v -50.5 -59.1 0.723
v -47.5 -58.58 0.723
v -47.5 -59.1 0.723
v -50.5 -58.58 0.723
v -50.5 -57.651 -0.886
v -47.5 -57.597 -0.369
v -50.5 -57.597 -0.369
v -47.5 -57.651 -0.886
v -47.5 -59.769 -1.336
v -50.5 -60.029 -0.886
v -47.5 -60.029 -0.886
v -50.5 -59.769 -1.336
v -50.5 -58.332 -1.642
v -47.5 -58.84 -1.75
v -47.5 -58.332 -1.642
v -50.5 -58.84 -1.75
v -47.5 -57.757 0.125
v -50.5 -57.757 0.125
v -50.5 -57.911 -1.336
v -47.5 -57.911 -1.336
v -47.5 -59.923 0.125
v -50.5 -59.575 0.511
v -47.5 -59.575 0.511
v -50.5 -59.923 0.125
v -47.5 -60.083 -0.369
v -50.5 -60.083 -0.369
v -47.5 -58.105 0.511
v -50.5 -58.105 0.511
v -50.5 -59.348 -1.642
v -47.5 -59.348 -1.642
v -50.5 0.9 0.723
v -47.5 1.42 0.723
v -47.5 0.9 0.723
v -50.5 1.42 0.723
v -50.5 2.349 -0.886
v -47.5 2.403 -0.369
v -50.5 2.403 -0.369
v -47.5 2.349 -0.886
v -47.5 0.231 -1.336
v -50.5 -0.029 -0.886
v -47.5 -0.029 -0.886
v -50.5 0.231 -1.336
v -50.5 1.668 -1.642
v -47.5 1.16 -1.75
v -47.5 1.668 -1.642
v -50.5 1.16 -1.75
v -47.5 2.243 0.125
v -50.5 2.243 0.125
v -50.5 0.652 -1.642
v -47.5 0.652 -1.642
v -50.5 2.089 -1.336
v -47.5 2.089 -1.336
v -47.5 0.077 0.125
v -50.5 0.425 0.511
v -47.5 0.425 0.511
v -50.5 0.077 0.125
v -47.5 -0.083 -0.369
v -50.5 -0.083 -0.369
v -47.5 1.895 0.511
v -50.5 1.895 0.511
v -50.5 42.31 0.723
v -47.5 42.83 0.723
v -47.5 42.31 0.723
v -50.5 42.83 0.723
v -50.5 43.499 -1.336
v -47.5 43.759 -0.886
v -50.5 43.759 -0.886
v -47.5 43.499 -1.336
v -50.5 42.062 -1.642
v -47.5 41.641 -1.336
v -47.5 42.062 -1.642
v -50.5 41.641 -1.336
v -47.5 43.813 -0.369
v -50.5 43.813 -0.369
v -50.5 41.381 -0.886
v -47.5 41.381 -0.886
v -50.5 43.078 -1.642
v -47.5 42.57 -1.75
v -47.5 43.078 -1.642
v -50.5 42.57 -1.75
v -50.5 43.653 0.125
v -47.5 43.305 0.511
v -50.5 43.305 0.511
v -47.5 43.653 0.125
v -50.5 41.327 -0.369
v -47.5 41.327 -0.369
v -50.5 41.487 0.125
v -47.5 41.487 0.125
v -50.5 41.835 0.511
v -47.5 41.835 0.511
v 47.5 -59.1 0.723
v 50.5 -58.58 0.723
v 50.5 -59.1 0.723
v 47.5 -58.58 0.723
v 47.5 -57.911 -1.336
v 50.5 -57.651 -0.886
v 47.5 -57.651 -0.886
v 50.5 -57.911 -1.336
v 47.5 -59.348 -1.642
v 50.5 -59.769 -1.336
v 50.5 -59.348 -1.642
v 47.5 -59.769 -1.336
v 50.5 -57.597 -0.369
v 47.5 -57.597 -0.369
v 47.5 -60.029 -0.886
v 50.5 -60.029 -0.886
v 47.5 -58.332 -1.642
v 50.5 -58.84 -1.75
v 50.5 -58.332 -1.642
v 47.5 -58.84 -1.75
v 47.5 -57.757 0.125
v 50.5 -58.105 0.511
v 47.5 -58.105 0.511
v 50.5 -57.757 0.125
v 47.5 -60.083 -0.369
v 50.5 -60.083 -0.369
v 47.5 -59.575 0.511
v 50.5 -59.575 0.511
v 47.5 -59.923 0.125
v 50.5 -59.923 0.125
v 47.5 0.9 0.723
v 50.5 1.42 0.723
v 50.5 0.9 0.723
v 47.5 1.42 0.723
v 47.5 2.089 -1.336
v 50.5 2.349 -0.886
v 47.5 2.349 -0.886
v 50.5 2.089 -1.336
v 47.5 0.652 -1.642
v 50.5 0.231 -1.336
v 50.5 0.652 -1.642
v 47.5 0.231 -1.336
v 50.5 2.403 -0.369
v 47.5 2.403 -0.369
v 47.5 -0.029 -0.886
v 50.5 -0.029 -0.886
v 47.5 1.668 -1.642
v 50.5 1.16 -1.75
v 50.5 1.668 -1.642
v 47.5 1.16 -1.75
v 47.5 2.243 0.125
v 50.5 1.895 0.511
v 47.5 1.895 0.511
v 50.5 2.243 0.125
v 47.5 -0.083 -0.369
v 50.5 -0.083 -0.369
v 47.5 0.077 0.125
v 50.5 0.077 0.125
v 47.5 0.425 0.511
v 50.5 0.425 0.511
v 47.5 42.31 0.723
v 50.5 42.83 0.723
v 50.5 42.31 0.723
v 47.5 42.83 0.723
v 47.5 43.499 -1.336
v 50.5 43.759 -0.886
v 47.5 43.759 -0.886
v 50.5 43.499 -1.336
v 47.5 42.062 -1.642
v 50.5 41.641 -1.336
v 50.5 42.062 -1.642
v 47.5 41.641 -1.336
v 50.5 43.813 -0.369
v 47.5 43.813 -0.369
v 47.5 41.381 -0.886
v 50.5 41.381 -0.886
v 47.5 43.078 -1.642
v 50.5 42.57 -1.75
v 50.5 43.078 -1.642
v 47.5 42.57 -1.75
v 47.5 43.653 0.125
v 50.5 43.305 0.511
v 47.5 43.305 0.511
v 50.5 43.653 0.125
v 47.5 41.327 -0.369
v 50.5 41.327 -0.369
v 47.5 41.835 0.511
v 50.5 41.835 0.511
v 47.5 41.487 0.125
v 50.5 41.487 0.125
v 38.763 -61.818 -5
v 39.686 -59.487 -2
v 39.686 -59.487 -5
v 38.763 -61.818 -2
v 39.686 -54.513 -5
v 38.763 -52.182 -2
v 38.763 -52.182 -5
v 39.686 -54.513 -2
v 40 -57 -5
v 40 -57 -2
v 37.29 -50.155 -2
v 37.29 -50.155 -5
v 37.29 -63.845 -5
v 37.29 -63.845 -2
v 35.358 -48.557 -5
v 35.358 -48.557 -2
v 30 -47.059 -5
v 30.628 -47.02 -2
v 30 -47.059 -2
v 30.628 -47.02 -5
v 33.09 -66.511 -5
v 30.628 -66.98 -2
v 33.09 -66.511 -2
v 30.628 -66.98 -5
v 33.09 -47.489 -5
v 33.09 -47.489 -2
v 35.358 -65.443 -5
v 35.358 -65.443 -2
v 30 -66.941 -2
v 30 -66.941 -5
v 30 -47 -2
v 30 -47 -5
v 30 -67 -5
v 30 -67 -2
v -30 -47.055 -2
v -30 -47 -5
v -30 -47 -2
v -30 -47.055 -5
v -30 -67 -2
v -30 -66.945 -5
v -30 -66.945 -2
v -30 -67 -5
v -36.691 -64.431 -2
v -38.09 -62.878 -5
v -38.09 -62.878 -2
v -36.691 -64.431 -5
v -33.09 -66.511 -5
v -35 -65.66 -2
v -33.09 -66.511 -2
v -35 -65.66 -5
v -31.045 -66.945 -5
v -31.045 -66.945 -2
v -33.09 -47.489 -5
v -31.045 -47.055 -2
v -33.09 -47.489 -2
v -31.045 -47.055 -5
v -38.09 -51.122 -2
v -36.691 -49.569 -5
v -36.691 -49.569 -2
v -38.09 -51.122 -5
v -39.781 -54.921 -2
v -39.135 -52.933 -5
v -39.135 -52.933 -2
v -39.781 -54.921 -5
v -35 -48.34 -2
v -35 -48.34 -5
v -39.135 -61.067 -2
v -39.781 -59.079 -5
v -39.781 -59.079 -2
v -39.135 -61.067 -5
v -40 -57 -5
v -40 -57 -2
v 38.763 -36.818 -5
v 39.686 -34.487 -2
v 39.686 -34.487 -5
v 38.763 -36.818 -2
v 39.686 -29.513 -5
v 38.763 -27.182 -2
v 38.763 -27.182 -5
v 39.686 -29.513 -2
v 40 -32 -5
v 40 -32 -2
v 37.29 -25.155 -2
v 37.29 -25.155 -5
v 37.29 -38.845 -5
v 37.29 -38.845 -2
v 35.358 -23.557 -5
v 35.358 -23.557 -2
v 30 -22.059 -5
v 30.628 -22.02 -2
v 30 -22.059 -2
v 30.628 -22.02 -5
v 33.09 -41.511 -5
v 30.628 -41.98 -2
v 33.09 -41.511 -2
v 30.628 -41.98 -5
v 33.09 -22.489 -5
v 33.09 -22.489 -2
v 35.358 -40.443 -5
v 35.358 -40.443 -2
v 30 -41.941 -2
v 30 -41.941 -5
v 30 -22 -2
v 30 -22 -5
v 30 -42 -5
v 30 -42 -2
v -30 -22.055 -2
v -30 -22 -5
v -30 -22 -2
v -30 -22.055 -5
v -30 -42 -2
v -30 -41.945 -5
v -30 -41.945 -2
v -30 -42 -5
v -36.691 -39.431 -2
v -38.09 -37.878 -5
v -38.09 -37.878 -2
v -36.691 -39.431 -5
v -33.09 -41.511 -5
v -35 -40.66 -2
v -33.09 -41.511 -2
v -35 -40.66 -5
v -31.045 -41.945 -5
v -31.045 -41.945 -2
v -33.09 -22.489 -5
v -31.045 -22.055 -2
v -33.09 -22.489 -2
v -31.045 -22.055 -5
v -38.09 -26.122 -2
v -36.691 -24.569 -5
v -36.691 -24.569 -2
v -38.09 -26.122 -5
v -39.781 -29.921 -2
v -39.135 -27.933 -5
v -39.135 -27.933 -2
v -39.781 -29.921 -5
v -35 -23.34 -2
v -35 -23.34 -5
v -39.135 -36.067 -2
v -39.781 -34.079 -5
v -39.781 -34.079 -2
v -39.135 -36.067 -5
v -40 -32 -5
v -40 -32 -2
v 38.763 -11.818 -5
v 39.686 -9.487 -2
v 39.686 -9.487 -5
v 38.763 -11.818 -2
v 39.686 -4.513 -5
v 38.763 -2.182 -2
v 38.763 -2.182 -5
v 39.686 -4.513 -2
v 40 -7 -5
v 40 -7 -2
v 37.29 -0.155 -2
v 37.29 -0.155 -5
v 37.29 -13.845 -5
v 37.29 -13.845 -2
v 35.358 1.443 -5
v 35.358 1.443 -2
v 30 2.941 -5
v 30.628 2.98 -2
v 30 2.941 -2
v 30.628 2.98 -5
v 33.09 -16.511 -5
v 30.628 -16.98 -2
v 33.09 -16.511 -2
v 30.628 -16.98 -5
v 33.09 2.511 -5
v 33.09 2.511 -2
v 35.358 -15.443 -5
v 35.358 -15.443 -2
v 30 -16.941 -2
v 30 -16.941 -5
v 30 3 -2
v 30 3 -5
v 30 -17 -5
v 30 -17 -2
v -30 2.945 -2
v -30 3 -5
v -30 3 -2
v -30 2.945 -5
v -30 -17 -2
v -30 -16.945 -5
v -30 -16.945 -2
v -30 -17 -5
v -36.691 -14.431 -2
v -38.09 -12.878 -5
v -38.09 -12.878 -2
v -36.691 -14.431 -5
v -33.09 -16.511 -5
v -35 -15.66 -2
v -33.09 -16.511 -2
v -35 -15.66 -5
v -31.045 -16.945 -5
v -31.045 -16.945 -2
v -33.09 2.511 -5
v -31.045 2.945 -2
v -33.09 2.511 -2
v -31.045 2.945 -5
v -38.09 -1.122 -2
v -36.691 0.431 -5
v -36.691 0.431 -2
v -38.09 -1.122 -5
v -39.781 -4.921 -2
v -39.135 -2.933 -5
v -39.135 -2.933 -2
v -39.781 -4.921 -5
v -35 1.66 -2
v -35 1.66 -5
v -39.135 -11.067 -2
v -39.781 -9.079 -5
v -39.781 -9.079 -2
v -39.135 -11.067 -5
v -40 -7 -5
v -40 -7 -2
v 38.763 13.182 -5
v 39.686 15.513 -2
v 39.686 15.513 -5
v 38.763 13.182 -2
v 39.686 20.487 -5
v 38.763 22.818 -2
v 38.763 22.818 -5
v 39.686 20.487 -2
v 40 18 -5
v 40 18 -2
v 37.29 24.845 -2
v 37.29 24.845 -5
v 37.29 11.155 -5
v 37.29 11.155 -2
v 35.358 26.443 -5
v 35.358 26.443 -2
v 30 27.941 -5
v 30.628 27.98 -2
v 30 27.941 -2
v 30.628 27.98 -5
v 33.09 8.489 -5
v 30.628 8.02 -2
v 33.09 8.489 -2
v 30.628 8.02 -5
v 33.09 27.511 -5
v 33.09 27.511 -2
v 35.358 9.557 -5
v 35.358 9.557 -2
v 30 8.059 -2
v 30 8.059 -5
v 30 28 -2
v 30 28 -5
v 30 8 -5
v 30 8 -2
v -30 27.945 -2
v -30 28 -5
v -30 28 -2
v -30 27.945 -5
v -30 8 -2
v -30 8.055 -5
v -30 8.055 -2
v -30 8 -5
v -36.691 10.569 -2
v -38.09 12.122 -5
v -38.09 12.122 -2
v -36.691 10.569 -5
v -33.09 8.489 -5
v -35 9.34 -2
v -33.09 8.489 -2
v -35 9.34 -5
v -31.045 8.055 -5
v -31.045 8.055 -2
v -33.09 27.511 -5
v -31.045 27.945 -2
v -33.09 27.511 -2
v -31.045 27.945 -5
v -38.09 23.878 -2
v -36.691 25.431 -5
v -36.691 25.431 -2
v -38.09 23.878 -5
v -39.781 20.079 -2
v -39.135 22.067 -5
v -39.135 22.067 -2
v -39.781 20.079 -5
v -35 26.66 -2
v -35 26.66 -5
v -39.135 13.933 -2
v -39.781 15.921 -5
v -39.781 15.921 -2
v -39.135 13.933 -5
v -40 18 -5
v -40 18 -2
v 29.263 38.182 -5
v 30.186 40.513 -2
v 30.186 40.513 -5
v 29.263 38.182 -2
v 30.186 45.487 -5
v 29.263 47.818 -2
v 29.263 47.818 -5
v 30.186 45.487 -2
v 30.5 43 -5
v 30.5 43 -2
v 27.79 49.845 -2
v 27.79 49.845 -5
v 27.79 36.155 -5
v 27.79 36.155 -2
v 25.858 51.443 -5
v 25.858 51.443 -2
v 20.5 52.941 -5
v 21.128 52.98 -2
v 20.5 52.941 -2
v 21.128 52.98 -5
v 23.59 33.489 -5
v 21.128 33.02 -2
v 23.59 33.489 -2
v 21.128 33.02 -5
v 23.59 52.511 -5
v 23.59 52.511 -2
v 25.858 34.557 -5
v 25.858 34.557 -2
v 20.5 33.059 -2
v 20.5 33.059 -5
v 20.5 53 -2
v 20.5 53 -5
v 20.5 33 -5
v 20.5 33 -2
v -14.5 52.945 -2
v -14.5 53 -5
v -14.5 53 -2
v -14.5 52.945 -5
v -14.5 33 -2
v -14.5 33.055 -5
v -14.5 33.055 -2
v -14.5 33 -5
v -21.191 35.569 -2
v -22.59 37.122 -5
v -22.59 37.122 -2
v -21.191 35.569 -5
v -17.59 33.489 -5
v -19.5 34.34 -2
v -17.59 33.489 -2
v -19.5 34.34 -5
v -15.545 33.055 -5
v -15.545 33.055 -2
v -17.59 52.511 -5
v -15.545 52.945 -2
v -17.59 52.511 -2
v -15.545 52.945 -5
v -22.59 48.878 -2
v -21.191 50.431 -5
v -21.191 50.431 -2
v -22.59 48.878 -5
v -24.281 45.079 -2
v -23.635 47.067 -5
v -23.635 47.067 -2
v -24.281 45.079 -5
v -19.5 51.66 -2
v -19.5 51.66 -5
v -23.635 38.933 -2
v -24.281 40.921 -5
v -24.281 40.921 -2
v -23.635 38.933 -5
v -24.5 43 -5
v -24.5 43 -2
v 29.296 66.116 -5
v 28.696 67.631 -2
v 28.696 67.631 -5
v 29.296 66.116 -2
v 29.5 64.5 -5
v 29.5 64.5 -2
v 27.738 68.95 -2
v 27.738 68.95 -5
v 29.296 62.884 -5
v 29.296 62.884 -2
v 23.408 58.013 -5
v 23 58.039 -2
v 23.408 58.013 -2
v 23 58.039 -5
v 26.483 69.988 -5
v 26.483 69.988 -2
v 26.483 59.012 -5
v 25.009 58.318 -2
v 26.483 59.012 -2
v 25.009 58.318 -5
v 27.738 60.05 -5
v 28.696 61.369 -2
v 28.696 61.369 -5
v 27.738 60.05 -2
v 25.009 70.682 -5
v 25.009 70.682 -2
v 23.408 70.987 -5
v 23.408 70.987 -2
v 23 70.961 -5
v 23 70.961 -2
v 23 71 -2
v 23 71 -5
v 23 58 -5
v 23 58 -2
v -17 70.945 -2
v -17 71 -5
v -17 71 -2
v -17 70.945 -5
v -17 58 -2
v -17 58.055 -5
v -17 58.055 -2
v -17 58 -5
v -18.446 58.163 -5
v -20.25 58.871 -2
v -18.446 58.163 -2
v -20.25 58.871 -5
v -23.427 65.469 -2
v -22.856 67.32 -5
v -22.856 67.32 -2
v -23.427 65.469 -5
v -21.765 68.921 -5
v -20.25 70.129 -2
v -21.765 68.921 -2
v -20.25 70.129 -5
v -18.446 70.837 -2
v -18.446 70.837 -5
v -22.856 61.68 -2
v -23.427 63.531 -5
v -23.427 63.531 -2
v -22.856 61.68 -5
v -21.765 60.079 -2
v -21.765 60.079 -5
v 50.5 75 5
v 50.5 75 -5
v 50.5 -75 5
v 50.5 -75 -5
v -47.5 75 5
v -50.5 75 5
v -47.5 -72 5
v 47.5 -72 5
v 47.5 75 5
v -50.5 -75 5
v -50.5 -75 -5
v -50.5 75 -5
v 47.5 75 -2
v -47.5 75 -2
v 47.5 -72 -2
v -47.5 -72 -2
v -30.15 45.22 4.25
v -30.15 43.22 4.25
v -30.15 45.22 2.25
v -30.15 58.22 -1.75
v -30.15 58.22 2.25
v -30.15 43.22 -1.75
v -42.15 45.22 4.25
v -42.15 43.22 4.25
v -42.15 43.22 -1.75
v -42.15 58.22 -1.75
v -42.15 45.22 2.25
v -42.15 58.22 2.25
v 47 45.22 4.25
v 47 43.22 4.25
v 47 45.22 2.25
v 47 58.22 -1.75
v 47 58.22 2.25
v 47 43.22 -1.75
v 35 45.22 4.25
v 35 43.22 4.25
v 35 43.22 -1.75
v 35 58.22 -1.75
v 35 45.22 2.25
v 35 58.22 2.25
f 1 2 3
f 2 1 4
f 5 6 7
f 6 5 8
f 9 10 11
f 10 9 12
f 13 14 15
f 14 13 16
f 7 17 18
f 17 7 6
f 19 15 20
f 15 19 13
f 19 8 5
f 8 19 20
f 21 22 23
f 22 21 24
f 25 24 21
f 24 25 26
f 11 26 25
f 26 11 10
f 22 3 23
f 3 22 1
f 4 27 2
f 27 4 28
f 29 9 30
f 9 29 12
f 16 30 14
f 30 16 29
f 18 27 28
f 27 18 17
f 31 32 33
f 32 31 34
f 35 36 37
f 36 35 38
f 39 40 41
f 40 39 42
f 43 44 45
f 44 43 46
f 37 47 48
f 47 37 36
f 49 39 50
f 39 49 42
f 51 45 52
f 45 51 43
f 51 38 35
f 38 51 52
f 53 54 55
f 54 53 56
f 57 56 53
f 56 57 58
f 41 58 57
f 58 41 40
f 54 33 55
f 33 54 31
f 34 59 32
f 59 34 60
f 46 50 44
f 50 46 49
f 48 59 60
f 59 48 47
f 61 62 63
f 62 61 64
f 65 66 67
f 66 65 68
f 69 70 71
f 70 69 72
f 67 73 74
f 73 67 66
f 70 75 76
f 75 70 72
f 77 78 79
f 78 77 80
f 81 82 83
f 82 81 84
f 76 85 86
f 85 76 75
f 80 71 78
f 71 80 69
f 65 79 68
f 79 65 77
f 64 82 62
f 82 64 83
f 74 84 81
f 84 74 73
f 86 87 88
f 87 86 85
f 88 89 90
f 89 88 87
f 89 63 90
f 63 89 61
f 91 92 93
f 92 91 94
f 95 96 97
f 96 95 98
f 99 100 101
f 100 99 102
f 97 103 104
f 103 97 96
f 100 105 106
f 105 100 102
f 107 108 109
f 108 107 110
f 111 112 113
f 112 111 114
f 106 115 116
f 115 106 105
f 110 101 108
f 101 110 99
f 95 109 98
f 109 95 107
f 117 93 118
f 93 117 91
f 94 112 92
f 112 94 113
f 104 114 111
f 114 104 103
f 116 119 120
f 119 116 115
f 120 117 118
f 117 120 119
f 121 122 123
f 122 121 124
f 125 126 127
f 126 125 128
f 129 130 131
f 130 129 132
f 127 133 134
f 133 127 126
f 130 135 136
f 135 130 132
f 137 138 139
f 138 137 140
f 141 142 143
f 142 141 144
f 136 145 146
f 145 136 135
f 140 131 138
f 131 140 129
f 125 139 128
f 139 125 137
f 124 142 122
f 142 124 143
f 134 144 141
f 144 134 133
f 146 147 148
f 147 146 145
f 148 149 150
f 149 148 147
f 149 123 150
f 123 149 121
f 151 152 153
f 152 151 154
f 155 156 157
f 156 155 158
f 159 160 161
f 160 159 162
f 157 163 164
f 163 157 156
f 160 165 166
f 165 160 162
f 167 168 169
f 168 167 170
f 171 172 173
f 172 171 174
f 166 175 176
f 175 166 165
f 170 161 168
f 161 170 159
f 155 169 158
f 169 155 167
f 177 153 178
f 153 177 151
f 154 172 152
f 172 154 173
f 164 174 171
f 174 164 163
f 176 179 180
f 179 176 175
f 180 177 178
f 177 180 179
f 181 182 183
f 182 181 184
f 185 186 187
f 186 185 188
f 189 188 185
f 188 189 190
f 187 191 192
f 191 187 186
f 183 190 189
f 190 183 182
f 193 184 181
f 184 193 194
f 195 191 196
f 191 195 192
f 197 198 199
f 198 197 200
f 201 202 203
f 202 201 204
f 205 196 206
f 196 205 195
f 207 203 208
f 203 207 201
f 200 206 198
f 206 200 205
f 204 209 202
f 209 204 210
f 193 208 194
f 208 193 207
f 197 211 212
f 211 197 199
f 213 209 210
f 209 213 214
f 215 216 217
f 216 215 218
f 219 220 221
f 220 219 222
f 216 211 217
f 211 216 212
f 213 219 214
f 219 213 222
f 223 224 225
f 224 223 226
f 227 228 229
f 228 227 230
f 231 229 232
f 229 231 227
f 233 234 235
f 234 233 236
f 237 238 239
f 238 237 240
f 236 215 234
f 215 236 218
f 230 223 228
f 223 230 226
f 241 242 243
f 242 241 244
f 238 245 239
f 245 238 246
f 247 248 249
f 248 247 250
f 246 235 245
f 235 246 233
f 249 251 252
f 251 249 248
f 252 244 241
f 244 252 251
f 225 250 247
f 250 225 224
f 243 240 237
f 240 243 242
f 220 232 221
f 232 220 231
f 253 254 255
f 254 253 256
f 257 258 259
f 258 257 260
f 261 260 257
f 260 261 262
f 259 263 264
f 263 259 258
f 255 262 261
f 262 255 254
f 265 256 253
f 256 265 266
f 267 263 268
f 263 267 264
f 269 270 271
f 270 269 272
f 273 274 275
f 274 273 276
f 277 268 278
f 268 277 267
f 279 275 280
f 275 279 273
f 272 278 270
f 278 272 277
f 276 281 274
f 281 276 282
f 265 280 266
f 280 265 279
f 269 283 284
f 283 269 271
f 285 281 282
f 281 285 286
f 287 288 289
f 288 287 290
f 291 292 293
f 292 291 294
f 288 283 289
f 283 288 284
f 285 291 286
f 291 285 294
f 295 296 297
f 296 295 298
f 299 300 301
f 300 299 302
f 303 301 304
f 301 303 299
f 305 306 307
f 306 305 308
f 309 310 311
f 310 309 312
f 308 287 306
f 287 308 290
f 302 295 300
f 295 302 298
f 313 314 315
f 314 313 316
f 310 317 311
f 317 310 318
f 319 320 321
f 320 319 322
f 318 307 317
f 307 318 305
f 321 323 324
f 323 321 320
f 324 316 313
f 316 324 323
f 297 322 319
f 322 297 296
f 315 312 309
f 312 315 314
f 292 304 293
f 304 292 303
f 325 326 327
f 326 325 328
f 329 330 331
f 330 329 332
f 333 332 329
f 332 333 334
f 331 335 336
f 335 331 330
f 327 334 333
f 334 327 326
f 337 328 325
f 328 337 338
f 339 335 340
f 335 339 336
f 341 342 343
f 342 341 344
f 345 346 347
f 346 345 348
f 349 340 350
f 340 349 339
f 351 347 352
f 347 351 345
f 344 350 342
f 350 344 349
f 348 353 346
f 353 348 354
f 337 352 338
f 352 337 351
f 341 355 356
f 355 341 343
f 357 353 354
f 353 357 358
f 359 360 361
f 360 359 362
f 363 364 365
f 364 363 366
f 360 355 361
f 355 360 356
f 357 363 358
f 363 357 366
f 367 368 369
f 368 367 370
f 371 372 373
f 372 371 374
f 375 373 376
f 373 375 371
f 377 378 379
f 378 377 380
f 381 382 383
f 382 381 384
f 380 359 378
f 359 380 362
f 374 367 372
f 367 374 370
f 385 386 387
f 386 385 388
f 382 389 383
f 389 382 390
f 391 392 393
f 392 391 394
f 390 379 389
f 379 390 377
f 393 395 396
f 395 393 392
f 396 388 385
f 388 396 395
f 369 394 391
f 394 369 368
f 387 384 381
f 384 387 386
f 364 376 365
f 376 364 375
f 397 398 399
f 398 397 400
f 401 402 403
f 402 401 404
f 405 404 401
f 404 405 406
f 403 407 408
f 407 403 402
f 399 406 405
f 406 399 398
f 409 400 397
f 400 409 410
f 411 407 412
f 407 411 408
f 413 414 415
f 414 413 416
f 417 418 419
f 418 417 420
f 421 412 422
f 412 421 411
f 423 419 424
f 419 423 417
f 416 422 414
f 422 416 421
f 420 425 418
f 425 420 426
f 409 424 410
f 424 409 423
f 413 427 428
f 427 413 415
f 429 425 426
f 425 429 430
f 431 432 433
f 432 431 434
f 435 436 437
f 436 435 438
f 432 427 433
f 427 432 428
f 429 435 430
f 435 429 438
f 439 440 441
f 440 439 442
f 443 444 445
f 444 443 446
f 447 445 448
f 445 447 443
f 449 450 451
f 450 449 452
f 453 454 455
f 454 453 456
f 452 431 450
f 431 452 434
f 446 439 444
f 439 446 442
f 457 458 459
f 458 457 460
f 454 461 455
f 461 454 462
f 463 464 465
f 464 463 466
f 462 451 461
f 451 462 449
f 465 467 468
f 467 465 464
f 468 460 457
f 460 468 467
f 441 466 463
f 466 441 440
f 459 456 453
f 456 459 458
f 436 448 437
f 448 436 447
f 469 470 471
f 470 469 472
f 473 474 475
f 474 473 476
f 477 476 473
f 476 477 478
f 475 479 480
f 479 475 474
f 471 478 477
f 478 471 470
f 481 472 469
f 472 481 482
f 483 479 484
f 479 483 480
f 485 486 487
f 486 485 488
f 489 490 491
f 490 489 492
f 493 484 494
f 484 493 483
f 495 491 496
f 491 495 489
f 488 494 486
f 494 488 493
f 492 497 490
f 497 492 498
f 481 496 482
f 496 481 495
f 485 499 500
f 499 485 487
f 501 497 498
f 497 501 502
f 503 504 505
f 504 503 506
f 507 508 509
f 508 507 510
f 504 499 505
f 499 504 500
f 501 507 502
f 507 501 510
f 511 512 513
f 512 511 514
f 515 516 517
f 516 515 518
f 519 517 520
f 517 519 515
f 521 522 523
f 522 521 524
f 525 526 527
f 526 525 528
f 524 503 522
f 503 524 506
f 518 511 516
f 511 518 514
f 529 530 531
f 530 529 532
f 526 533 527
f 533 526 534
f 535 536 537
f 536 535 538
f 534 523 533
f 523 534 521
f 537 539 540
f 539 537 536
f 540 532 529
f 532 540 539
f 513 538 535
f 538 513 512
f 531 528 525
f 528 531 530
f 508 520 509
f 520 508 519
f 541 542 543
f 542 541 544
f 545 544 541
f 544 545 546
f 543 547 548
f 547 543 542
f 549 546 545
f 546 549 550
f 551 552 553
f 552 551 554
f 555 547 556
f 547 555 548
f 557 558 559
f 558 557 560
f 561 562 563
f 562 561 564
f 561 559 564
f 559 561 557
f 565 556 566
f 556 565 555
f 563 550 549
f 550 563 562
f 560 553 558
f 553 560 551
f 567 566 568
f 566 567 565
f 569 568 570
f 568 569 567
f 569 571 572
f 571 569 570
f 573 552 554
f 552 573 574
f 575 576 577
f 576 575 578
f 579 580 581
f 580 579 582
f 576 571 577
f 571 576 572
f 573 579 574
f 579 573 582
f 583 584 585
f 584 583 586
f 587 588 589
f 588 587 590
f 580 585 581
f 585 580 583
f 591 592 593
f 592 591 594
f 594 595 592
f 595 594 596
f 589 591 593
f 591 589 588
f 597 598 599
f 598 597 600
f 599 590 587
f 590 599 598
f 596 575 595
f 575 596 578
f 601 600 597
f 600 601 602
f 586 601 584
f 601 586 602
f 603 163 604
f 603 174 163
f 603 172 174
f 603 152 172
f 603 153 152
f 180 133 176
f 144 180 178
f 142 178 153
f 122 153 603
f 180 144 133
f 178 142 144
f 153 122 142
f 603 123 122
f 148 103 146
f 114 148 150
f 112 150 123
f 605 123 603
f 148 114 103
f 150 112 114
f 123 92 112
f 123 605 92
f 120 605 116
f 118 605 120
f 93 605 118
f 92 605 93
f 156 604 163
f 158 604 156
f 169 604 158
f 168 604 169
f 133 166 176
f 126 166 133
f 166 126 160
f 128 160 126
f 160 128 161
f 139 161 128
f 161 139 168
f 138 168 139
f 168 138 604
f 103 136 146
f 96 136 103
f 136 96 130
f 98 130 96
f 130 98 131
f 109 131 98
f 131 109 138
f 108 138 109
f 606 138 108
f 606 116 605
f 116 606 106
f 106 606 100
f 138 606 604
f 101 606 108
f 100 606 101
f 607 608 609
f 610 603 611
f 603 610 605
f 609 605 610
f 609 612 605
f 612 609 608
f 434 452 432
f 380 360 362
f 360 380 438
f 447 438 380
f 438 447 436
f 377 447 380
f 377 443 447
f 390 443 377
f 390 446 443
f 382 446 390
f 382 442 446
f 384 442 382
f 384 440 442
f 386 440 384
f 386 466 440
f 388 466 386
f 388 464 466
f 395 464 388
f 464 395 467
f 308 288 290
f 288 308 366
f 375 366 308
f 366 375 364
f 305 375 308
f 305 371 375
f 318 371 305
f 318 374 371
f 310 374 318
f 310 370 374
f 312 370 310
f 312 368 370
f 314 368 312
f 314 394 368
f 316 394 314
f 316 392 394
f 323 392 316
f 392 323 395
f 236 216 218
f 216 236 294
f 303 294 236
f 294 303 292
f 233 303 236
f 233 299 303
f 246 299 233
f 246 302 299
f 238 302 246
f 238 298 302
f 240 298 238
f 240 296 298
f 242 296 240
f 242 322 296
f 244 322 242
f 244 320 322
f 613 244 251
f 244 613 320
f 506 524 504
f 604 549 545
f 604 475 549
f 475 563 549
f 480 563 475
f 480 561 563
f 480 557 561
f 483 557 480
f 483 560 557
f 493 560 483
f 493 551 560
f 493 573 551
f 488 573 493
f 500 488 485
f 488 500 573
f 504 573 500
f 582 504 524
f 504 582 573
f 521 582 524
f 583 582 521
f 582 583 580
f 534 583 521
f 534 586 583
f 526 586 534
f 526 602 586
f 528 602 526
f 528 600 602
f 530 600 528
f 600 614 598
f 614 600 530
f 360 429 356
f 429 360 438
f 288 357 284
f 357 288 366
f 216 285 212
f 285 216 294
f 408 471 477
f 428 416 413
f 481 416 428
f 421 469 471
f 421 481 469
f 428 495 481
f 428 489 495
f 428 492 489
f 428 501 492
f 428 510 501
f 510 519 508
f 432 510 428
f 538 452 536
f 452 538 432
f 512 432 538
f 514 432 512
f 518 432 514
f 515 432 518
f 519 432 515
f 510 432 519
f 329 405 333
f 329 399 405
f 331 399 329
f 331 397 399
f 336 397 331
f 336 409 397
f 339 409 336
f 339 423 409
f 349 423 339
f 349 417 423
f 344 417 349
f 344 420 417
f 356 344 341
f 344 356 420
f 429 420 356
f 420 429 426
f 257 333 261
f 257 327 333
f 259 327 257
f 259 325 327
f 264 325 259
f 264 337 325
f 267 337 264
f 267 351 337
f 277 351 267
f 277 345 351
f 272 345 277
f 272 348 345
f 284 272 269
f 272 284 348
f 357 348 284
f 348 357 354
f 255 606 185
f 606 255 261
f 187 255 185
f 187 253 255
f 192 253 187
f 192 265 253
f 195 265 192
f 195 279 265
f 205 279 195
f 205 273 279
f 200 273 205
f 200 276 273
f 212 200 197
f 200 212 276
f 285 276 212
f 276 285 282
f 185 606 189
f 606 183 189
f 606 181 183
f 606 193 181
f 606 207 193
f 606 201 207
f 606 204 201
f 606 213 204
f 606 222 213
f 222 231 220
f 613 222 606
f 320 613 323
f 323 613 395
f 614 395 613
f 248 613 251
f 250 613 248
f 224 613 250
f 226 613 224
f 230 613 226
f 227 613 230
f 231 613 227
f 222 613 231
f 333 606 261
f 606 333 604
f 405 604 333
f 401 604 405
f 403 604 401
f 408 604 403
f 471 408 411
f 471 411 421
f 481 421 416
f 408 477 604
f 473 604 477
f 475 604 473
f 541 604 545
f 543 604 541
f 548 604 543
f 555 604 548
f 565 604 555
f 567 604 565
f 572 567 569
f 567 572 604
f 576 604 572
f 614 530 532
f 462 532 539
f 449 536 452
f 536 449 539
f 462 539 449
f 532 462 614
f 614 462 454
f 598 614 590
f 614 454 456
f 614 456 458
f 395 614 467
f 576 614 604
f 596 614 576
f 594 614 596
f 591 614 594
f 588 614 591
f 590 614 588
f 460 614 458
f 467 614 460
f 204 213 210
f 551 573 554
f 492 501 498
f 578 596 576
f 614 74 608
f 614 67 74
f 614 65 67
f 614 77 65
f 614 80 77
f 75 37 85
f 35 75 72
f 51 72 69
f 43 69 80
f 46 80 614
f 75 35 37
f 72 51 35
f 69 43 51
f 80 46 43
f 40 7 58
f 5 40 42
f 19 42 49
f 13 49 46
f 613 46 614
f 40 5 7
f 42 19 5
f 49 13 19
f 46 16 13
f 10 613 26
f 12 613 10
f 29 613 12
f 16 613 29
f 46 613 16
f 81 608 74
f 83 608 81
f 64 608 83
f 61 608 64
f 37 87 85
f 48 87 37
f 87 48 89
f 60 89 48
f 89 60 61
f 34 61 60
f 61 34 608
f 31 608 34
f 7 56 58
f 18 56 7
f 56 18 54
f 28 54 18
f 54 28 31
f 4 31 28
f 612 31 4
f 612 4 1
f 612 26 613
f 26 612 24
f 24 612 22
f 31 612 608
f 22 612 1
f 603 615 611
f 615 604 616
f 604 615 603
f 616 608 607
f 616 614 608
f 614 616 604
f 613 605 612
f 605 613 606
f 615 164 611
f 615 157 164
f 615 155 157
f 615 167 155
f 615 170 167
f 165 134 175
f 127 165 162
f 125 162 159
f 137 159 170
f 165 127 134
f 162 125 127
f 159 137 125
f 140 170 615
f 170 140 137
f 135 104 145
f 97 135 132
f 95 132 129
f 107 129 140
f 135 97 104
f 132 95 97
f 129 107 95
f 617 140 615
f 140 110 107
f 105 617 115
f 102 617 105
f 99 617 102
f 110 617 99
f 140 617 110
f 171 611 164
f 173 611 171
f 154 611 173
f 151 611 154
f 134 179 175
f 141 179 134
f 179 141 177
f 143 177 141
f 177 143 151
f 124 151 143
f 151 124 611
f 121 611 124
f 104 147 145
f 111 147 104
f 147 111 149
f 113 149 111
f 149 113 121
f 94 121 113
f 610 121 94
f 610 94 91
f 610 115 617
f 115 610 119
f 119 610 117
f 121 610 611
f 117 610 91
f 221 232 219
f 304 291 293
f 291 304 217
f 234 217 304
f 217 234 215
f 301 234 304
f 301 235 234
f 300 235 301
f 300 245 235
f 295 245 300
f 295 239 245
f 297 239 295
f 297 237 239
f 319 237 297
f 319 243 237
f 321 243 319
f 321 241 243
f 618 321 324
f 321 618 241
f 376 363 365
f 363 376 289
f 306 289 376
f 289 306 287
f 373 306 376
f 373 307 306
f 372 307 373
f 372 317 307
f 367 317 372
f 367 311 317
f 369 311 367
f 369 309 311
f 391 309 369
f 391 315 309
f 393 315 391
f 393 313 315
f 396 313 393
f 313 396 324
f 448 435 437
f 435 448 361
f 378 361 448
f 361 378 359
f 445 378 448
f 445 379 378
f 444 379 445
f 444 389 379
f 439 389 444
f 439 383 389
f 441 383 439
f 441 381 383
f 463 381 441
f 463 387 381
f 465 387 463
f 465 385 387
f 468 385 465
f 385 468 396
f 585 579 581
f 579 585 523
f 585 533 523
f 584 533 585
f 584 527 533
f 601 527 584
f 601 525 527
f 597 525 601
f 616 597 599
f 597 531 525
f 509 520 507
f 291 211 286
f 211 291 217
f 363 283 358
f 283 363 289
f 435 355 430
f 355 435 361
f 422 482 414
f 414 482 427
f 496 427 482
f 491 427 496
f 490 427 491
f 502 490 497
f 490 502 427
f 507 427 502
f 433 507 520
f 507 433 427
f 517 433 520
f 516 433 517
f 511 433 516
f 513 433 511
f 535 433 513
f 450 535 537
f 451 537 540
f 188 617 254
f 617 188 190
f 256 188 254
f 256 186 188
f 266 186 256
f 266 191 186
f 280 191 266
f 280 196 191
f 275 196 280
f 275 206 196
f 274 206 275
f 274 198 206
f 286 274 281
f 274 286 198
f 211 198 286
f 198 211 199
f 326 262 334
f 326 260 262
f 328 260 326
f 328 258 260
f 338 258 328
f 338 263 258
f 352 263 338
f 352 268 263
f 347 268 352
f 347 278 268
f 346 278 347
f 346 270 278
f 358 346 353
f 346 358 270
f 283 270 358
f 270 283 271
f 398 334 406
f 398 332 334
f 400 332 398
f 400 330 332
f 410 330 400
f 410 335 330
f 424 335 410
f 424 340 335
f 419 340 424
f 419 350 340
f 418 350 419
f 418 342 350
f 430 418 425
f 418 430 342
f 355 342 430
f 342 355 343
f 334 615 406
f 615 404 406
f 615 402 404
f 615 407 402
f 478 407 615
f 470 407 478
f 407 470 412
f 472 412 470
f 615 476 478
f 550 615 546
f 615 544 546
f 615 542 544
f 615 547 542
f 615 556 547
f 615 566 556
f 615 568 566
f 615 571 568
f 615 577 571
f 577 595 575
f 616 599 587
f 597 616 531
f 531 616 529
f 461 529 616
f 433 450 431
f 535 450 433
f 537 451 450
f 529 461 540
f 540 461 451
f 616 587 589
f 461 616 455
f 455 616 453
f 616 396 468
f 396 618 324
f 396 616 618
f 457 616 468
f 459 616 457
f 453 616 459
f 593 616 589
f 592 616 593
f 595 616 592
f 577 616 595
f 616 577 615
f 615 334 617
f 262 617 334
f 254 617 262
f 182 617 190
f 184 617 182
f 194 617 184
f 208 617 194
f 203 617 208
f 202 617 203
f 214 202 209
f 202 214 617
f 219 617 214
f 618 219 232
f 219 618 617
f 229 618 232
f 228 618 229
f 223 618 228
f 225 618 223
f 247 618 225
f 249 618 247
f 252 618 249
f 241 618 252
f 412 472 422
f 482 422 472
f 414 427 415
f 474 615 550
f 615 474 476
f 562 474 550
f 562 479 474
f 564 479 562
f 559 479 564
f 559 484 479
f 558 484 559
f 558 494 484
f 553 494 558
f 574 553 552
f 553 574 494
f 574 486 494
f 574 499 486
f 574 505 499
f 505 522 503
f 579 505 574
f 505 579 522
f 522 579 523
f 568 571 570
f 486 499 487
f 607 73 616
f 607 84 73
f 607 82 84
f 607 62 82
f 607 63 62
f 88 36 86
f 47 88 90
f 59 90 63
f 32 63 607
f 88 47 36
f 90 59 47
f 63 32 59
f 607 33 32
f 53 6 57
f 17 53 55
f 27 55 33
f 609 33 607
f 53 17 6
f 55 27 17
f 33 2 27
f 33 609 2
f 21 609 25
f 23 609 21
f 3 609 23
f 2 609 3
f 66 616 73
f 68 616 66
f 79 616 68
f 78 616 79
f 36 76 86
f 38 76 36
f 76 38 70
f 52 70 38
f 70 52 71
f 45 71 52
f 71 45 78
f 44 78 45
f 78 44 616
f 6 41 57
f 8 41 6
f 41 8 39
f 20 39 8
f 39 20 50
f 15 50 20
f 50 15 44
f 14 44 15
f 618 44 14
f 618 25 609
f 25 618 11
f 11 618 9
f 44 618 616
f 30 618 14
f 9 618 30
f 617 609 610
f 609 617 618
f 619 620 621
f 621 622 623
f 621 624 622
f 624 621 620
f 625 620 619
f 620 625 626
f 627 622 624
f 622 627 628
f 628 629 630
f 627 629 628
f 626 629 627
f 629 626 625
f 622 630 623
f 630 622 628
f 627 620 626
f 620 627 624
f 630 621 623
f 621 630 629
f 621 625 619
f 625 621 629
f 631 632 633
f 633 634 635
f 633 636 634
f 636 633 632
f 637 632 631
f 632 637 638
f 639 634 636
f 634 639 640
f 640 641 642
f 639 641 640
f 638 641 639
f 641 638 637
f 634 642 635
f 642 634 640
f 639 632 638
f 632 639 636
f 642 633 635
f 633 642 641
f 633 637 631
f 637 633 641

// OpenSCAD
// 1.8" ZIF IDE to 3.5" tray
// Written by Michael Berry <michaelaberry@gmail.com>
model_version = "v1.0.0";

// Features: 
//  - ZIF to IDE Adapter mount
//  - Mount holes for 3.5" HDD
//  - Space for 1.8" ZIF IDE HDD/SDD

/*
TODO:
 - Add mounting holes to IDE board
 - Add proper lined holes to IDE board supports
*/
thickness = 3;

tray_x = 101;
tray_y = 150;
tray_z = 10;

offset_tray_x = tray_x / 2;
offset_tray_y = tray_y / 2;
offset_tray_z = tray_z / 2;

//Render the tray
difference() {
    color([0.9, 0.9, 0.9]) cube([tray_x, tray_y, tray_z], center = true);
    // Carve out the inner tray
    translate([0, thickness, thickness]) {
        cube([tray_x - 6, tray_y, tray_z], center = true);
    }

    // Carve out the mounting holes
    trayMount();
    mirror([tray_x, 0, 0]) trayMount();

    // Save some plastic!
    plasticSaverBase();
}

//Add supports
ideAdapterSupport();

//Parts Fitment Debugging
//ribbon();
//drive();
//ideAdapterBoard();

//Supports / Brackets / Mounts "Library"
module backSupport() {
    translate([20 - offset_tray_x, offset_tray_y - thickness, thickness - offset_tray_z]) {
        rotate([0, 0, 90]) prism(thickness, 17, tray_z - thickness);
    }
}
module trayMount() {
    from_front = 16.16;
    from_bottom = 6.5;
    diameter = 2.5;
    
    //Front mounting hole
    translate([offset_tray_x - tray_x, from_front - offset_tray_y, from_bottom - tray_z + thickness]) {
        rotate([0, 90, 0]) cylinder(r = diameter / 2, h = thickness * 2.5, center = true, $fn = 15);
    }
    
    //Middle mounting hole, offset 41mm backward from front:
    translate([offset_tray_x - tray_x, 60 + from_front - offset_tray_y, from_bottom - tray_z + thickness]) {
        rotate([0, 90, 0]) cylinder(r = diameter / 2, h = thickness * 2.5, center = true, $fn = 15);
    }
    
    //Rear mounting hole, offset 101mm backward from front:
    translate([offset_tray_x - tray_x, 101.41 + from_front - offset_tray_y, from_bottom - tray_z + thickness]) {
        rotate([0, 90, 0]) cylinder(r = diameter / 2, h = thickness * 2.5, center = true, $fn = 15);
    }
}
module ideAdapterSupport() {
    ide_x = 89.15;
    ide_y = 30.78;
    
    x = 12;
    y = 15;
    z = 6;
    
    translate([offset_tray_x - ide_x - thickness - 0.5, tray_y - offset_tray_y - ide_y - 1, offset_tray_z - tray_z + thickness + 0.25 ]) {     
        difference() {
            cube([x, y, z], center = false);
            
            translate([0,2,z-2]) { cube([x, y, z-2], center = false); }
        }
    }
    
    translate([offset_tray_x - x - thickness - 0.5, tray_y - offset_tray_y - ide_y - 1, offset_tray_z - tray_z + thickness + 0.25 ]) {     
        difference() {
            cube([x, y, z], center = false);
            
            translate([0,2,z-2]) { cube([x, y, z-2], center = false); }
        }
    }
}

module plasticSaverBase() {
    hole_dia=20;
    hole_len=60;
    
    translate([hole_len / 2, -offset_tray_y + hole_dia / 2 + thickness + 5, offset_tray_z - tray_z - 1])
    cheeseHoles(hole_dia, hole_len);
    translate([hole_len / 2, -offset_tray_y + hole_dia / 2 + thickness + 30, offset_tray_z - tray_z - 1])
    cheeseHoles(hole_dia, hole_len);
    translate([hole_len / 2, -offset_tray_y + hole_dia / 2 + thickness + 55, offset_tray_z - tray_z - 1])
    cheeseHoles(hole_dia, hole_len);
    translate([hole_len / 2, -offset_tray_y + hole_dia / 2 + thickness + 80, offset_tray_z - tray_z - 1])
    cheeseHoles(hole_dia, hole_len);
    
    hole_len2=35;
    translate([hole_len2 / 2 + 3, -offset_tray_y + hole_dia / 2 + thickness + 105, offset_tray_z - tray_z - 1])
    cheeseHoles(hole_dia, hole_len2);
    
    hole_dia2=13;
    hole_len3=40;
    translate([hole_len3 / 2 + 3, -offset_tray_y + hole_dia2 / 2 + thickness + 130, offset_tray_z - tray_z - 1])
    cheeseHoles(hole_dia2, hole_len3);
}


//Fitment model "library"
module drive() {
    drive_x = 54;
    drive_y = 71;
    drive_z = 6;
    
    translate([offset_tray_x - drive_x - thickness - 1, offset_tray_y - tray_y + 0.5, offset_tray_z - tray_z + thickness + 0.25 ]) {
        cube([drive_x, drive_y, drive_z], center = false);
    }
}

module ribbon() {
    ribbon_x = 20.4;
    ribbon_y = 52;
    ribbon_z = 0.5;
    ide_edge_offset = 18;
    ide_connector = 28.78;
    
    //18mm from edge of IDE board
    translate([offset_tray_x - ribbon_x - thickness - ide_edge_offset - 0.5, offset_tray_y - ribbon_y - ide_connector, offset_tray_z - tray_z + thickness + 0.25 + 5 ]) {
        cube([ribbon_x, ribbon_y, ribbon_z], center = false);
    }    
    
}
module ideAdapterBoard() {
    ide_x = 89.15;
    ide_y = 30.78;
    ide_z = 8.2;
    
    mount_x = 20.65;
    ide_mount_y = 4.5;
    pwr_mount_y = 4.82;

    translate([offset_tray_x - ide_x - thickness - 0.5, tray_y - offset_tray_y - ide_y, offset_tray_z - tray_z + thickness + 0.25 ]) {     
        difference() {
            cube([ide_x, ide_y, ide_z], center = false);

            // connector 8.89mm x 3.45mm 
            cube([ide_x, ide_y - 8.89, 3.45], center = false);

            translate([0,0,5]) { cube([ide_x, ide_y - 8.89, 3.45], center = false); }
            
            //TODO: Maybe define the mounting holes...
        }
    }
}

//Shapes "library"
module cheeseHoles(d, l, h = 5) {
    //make a stretched cylinder with diameter 'd' and length 'l'
    union() {
        cylinder(r = d / 2, h = h, center = false, $fn = 25);
        translate([-l, -(d / 2), 0]) cube([l, d, h], center = false);
        translate([-l, 0, 0]) cylinder(r = d / 2, h = h, center = false);
    }
}

echo("Model Version", model_version); 
echo("OpenSCAD Version:", version());
